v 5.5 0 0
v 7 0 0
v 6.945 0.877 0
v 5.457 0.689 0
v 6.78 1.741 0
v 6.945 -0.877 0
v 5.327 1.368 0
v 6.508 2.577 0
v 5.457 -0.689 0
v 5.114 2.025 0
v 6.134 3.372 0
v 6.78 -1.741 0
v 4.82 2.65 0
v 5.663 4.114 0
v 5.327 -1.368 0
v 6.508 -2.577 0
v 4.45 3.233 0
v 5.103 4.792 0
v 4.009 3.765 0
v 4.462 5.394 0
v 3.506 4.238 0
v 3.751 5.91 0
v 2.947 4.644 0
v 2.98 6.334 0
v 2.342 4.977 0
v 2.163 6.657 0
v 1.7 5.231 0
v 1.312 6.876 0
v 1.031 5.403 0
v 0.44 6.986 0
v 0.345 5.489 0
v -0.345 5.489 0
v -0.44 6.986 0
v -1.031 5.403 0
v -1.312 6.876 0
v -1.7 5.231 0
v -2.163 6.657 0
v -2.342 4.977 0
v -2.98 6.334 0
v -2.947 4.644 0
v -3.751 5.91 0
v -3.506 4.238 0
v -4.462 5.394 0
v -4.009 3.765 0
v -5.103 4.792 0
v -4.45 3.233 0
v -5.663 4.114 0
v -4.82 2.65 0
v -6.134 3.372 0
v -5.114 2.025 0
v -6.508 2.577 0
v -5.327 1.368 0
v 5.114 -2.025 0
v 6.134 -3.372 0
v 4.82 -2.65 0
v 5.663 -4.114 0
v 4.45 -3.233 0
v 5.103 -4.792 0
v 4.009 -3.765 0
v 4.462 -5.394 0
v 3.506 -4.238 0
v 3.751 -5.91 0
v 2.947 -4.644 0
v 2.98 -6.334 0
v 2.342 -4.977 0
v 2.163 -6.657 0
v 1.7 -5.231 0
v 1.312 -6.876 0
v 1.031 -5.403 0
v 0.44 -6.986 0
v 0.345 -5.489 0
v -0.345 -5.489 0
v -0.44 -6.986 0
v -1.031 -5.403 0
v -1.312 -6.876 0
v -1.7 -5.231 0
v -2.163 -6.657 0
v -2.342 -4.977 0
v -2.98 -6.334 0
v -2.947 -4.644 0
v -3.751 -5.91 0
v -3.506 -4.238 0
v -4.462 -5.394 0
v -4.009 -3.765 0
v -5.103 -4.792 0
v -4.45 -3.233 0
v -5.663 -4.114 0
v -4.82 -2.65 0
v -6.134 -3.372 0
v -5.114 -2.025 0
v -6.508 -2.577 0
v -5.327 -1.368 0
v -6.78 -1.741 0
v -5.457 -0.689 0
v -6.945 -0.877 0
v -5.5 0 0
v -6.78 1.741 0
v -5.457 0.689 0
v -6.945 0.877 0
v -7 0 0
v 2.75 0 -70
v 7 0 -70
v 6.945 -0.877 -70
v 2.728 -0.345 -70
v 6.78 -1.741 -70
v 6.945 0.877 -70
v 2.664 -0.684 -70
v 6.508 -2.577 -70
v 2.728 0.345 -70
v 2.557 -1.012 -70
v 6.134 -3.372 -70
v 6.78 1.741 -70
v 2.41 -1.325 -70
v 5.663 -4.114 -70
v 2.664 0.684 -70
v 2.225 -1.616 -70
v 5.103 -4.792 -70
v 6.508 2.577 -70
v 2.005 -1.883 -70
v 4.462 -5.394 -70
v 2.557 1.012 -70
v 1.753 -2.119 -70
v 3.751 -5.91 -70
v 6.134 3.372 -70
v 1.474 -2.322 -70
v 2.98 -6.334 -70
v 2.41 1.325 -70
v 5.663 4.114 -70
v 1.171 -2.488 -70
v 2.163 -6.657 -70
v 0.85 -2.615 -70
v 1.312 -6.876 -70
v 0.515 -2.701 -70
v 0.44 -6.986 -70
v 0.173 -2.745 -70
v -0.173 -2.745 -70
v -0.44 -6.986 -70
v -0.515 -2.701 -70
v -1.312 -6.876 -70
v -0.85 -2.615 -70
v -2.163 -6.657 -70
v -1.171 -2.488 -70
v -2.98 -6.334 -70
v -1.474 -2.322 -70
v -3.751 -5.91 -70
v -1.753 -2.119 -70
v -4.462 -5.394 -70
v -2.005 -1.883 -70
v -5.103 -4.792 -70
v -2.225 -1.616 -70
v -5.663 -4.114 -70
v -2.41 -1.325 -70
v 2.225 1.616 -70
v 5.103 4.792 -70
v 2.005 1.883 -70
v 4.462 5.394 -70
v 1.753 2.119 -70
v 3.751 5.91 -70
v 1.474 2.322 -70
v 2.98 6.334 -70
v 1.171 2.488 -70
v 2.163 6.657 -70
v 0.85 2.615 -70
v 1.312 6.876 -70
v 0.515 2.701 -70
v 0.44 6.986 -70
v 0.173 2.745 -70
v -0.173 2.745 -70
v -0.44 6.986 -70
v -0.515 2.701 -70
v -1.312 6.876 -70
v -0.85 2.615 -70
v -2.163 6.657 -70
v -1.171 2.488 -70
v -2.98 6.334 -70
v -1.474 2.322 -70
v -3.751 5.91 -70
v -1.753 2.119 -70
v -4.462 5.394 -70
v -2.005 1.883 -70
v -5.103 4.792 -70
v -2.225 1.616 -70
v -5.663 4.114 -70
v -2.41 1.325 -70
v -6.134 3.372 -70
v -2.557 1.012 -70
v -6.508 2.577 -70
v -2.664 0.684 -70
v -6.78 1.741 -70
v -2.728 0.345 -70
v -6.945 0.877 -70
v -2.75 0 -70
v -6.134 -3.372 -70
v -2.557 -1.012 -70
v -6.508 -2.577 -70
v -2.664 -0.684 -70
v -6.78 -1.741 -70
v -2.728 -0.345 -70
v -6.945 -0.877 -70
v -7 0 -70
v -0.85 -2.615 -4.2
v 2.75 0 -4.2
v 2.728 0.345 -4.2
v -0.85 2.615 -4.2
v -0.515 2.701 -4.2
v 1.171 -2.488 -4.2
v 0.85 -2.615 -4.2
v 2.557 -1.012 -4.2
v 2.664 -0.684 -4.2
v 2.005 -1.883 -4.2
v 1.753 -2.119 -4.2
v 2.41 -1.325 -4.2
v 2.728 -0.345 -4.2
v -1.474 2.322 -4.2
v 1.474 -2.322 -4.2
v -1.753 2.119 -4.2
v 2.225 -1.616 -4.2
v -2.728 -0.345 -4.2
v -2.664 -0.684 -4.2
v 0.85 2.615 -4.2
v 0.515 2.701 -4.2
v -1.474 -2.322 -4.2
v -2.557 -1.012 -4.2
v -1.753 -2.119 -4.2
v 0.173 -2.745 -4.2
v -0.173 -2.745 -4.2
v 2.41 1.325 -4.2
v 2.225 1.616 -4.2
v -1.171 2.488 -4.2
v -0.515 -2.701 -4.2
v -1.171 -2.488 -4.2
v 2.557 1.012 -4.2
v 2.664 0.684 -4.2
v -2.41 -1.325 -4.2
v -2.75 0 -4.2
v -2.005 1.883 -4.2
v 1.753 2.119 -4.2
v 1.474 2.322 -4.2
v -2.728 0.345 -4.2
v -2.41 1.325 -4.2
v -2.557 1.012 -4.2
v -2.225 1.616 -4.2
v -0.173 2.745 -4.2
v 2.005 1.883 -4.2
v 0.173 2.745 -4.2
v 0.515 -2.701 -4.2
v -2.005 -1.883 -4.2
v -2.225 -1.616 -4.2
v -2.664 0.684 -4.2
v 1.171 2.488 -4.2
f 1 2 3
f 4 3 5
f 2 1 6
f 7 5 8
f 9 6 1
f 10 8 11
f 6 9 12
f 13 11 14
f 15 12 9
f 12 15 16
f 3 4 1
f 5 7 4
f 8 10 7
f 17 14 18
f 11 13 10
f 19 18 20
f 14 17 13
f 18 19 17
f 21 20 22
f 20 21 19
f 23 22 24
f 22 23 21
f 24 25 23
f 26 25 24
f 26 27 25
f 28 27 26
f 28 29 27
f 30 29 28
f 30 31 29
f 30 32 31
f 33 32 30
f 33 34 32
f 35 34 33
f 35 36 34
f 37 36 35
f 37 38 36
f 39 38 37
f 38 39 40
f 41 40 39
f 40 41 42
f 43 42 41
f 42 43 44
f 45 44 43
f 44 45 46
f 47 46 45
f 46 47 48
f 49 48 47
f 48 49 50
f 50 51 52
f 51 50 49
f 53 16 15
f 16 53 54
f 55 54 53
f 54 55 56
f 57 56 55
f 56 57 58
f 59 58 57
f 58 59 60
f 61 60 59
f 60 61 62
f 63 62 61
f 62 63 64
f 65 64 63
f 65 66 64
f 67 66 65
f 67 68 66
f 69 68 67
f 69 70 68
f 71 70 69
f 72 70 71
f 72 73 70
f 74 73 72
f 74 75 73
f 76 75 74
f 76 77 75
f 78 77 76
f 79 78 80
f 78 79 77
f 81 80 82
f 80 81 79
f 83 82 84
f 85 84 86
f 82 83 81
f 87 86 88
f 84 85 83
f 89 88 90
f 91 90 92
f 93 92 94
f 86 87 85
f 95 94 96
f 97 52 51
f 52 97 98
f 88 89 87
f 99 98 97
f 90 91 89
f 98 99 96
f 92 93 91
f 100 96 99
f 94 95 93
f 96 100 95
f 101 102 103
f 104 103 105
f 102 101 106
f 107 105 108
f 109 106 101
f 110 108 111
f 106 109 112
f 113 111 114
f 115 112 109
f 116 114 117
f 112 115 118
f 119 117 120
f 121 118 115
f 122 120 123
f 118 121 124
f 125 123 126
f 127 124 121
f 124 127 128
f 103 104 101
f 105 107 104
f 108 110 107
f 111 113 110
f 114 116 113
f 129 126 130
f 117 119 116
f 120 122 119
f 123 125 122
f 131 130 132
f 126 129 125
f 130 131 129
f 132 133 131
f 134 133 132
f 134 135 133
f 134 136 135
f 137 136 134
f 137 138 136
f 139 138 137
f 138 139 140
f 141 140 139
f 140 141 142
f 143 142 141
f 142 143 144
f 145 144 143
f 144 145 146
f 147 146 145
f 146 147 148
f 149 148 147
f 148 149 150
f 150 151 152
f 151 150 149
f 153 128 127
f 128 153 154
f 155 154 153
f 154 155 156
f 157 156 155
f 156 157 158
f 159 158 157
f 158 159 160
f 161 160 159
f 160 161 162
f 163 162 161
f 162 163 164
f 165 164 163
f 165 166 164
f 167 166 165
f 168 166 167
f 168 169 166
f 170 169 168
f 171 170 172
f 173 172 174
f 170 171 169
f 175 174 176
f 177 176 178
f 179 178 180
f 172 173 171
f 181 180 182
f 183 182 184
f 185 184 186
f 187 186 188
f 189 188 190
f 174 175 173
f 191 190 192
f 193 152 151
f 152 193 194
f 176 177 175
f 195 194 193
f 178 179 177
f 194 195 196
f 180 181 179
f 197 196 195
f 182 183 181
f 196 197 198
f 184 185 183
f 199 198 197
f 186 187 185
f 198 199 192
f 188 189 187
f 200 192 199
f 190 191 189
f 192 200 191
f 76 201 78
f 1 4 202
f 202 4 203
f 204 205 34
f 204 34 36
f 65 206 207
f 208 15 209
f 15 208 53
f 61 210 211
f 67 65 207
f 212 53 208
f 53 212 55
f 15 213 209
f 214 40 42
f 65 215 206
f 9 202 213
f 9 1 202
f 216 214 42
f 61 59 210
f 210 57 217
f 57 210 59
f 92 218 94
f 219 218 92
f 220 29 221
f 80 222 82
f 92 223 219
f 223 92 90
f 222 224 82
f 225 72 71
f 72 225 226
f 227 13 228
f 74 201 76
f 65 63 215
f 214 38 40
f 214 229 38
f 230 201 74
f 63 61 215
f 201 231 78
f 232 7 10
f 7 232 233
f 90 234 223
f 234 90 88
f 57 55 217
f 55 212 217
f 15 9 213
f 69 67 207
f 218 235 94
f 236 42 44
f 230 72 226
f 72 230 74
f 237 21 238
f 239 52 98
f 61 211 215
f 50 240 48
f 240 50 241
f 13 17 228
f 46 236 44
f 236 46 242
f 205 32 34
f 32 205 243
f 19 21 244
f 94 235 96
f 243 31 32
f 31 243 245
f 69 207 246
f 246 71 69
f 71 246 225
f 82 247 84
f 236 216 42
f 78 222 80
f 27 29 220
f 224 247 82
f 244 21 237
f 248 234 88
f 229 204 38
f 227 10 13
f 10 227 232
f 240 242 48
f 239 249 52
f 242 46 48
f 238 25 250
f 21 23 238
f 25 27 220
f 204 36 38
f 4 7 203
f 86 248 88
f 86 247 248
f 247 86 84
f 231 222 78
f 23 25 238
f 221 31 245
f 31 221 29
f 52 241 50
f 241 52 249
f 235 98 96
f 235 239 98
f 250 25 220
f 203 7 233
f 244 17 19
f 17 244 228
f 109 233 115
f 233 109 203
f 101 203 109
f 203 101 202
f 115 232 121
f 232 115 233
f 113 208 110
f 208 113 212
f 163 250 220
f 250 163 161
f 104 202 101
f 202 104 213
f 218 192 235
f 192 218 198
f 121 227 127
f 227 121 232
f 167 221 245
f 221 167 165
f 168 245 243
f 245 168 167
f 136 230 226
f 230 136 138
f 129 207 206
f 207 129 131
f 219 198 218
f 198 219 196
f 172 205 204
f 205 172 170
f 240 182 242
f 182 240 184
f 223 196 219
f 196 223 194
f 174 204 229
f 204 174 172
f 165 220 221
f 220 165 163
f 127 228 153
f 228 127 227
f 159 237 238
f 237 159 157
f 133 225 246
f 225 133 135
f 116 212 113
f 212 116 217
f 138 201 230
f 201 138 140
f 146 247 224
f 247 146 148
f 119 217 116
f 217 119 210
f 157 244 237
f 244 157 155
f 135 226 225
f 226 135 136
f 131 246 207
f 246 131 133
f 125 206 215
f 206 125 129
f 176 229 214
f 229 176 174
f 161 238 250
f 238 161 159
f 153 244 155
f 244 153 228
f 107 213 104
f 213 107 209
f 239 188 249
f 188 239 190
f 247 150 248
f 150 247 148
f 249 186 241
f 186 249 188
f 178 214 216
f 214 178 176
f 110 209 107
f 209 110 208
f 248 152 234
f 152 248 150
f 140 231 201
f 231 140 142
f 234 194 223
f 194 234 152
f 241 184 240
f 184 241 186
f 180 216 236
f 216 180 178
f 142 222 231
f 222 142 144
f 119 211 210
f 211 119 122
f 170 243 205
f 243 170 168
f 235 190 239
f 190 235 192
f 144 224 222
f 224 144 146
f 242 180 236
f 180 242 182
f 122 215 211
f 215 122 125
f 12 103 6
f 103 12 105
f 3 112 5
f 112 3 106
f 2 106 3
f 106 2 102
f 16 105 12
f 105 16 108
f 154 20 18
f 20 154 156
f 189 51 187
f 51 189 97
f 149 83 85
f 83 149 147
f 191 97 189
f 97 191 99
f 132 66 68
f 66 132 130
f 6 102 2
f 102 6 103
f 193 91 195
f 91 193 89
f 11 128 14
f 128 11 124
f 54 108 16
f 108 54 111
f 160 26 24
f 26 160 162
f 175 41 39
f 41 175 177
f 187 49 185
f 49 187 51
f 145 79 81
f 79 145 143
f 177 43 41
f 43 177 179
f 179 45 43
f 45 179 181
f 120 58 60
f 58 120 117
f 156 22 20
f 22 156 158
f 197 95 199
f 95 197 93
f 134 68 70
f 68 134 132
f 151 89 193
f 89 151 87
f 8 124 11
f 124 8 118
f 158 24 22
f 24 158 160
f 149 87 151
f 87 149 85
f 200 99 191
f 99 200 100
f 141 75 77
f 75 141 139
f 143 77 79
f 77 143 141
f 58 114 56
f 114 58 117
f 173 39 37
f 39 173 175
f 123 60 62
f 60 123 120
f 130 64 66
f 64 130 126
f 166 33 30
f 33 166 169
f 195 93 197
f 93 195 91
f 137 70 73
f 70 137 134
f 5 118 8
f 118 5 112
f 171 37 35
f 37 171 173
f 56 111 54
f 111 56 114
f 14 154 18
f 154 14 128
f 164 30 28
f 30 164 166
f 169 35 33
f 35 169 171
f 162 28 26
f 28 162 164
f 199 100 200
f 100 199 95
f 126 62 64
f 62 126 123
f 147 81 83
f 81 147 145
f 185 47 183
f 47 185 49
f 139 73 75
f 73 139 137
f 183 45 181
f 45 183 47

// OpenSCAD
$fn = 50;


difference() {
	union() {
		translate(v = [0, 0, -70.0000000000]) {
			cylinder(h = 70, r = 7.0000000000);
		}
		cylinder(h = 0, r = 13.0000000000);
	}
	union() {
		translate(v = [0, 0, 0]) {
			rotate(a = [0, 0, 0]) {
				difference() {
					union() {
						#translate(v = [0, 0, -70.0000000000]) {
							cylinder(h = 70, r = 2.2500000000);
						}
						#translate(v = [0, 0, -4.2000000000]) {
							cylinder(h = 4.2000000000, r1 = 2.7500000000, r2 = 5.5000000000);
						}
						#translate(v = [0, 0, -70.0000000000]) {
							cylinder(h = 70, r = 2.7500000000);
						}
						#translate(v = [0, 0, -70.0000000000]) {
							cylinder(h = 70, r = 2.2500000000);
						}
					}
					union();
				}
			}
		}
	}
}
